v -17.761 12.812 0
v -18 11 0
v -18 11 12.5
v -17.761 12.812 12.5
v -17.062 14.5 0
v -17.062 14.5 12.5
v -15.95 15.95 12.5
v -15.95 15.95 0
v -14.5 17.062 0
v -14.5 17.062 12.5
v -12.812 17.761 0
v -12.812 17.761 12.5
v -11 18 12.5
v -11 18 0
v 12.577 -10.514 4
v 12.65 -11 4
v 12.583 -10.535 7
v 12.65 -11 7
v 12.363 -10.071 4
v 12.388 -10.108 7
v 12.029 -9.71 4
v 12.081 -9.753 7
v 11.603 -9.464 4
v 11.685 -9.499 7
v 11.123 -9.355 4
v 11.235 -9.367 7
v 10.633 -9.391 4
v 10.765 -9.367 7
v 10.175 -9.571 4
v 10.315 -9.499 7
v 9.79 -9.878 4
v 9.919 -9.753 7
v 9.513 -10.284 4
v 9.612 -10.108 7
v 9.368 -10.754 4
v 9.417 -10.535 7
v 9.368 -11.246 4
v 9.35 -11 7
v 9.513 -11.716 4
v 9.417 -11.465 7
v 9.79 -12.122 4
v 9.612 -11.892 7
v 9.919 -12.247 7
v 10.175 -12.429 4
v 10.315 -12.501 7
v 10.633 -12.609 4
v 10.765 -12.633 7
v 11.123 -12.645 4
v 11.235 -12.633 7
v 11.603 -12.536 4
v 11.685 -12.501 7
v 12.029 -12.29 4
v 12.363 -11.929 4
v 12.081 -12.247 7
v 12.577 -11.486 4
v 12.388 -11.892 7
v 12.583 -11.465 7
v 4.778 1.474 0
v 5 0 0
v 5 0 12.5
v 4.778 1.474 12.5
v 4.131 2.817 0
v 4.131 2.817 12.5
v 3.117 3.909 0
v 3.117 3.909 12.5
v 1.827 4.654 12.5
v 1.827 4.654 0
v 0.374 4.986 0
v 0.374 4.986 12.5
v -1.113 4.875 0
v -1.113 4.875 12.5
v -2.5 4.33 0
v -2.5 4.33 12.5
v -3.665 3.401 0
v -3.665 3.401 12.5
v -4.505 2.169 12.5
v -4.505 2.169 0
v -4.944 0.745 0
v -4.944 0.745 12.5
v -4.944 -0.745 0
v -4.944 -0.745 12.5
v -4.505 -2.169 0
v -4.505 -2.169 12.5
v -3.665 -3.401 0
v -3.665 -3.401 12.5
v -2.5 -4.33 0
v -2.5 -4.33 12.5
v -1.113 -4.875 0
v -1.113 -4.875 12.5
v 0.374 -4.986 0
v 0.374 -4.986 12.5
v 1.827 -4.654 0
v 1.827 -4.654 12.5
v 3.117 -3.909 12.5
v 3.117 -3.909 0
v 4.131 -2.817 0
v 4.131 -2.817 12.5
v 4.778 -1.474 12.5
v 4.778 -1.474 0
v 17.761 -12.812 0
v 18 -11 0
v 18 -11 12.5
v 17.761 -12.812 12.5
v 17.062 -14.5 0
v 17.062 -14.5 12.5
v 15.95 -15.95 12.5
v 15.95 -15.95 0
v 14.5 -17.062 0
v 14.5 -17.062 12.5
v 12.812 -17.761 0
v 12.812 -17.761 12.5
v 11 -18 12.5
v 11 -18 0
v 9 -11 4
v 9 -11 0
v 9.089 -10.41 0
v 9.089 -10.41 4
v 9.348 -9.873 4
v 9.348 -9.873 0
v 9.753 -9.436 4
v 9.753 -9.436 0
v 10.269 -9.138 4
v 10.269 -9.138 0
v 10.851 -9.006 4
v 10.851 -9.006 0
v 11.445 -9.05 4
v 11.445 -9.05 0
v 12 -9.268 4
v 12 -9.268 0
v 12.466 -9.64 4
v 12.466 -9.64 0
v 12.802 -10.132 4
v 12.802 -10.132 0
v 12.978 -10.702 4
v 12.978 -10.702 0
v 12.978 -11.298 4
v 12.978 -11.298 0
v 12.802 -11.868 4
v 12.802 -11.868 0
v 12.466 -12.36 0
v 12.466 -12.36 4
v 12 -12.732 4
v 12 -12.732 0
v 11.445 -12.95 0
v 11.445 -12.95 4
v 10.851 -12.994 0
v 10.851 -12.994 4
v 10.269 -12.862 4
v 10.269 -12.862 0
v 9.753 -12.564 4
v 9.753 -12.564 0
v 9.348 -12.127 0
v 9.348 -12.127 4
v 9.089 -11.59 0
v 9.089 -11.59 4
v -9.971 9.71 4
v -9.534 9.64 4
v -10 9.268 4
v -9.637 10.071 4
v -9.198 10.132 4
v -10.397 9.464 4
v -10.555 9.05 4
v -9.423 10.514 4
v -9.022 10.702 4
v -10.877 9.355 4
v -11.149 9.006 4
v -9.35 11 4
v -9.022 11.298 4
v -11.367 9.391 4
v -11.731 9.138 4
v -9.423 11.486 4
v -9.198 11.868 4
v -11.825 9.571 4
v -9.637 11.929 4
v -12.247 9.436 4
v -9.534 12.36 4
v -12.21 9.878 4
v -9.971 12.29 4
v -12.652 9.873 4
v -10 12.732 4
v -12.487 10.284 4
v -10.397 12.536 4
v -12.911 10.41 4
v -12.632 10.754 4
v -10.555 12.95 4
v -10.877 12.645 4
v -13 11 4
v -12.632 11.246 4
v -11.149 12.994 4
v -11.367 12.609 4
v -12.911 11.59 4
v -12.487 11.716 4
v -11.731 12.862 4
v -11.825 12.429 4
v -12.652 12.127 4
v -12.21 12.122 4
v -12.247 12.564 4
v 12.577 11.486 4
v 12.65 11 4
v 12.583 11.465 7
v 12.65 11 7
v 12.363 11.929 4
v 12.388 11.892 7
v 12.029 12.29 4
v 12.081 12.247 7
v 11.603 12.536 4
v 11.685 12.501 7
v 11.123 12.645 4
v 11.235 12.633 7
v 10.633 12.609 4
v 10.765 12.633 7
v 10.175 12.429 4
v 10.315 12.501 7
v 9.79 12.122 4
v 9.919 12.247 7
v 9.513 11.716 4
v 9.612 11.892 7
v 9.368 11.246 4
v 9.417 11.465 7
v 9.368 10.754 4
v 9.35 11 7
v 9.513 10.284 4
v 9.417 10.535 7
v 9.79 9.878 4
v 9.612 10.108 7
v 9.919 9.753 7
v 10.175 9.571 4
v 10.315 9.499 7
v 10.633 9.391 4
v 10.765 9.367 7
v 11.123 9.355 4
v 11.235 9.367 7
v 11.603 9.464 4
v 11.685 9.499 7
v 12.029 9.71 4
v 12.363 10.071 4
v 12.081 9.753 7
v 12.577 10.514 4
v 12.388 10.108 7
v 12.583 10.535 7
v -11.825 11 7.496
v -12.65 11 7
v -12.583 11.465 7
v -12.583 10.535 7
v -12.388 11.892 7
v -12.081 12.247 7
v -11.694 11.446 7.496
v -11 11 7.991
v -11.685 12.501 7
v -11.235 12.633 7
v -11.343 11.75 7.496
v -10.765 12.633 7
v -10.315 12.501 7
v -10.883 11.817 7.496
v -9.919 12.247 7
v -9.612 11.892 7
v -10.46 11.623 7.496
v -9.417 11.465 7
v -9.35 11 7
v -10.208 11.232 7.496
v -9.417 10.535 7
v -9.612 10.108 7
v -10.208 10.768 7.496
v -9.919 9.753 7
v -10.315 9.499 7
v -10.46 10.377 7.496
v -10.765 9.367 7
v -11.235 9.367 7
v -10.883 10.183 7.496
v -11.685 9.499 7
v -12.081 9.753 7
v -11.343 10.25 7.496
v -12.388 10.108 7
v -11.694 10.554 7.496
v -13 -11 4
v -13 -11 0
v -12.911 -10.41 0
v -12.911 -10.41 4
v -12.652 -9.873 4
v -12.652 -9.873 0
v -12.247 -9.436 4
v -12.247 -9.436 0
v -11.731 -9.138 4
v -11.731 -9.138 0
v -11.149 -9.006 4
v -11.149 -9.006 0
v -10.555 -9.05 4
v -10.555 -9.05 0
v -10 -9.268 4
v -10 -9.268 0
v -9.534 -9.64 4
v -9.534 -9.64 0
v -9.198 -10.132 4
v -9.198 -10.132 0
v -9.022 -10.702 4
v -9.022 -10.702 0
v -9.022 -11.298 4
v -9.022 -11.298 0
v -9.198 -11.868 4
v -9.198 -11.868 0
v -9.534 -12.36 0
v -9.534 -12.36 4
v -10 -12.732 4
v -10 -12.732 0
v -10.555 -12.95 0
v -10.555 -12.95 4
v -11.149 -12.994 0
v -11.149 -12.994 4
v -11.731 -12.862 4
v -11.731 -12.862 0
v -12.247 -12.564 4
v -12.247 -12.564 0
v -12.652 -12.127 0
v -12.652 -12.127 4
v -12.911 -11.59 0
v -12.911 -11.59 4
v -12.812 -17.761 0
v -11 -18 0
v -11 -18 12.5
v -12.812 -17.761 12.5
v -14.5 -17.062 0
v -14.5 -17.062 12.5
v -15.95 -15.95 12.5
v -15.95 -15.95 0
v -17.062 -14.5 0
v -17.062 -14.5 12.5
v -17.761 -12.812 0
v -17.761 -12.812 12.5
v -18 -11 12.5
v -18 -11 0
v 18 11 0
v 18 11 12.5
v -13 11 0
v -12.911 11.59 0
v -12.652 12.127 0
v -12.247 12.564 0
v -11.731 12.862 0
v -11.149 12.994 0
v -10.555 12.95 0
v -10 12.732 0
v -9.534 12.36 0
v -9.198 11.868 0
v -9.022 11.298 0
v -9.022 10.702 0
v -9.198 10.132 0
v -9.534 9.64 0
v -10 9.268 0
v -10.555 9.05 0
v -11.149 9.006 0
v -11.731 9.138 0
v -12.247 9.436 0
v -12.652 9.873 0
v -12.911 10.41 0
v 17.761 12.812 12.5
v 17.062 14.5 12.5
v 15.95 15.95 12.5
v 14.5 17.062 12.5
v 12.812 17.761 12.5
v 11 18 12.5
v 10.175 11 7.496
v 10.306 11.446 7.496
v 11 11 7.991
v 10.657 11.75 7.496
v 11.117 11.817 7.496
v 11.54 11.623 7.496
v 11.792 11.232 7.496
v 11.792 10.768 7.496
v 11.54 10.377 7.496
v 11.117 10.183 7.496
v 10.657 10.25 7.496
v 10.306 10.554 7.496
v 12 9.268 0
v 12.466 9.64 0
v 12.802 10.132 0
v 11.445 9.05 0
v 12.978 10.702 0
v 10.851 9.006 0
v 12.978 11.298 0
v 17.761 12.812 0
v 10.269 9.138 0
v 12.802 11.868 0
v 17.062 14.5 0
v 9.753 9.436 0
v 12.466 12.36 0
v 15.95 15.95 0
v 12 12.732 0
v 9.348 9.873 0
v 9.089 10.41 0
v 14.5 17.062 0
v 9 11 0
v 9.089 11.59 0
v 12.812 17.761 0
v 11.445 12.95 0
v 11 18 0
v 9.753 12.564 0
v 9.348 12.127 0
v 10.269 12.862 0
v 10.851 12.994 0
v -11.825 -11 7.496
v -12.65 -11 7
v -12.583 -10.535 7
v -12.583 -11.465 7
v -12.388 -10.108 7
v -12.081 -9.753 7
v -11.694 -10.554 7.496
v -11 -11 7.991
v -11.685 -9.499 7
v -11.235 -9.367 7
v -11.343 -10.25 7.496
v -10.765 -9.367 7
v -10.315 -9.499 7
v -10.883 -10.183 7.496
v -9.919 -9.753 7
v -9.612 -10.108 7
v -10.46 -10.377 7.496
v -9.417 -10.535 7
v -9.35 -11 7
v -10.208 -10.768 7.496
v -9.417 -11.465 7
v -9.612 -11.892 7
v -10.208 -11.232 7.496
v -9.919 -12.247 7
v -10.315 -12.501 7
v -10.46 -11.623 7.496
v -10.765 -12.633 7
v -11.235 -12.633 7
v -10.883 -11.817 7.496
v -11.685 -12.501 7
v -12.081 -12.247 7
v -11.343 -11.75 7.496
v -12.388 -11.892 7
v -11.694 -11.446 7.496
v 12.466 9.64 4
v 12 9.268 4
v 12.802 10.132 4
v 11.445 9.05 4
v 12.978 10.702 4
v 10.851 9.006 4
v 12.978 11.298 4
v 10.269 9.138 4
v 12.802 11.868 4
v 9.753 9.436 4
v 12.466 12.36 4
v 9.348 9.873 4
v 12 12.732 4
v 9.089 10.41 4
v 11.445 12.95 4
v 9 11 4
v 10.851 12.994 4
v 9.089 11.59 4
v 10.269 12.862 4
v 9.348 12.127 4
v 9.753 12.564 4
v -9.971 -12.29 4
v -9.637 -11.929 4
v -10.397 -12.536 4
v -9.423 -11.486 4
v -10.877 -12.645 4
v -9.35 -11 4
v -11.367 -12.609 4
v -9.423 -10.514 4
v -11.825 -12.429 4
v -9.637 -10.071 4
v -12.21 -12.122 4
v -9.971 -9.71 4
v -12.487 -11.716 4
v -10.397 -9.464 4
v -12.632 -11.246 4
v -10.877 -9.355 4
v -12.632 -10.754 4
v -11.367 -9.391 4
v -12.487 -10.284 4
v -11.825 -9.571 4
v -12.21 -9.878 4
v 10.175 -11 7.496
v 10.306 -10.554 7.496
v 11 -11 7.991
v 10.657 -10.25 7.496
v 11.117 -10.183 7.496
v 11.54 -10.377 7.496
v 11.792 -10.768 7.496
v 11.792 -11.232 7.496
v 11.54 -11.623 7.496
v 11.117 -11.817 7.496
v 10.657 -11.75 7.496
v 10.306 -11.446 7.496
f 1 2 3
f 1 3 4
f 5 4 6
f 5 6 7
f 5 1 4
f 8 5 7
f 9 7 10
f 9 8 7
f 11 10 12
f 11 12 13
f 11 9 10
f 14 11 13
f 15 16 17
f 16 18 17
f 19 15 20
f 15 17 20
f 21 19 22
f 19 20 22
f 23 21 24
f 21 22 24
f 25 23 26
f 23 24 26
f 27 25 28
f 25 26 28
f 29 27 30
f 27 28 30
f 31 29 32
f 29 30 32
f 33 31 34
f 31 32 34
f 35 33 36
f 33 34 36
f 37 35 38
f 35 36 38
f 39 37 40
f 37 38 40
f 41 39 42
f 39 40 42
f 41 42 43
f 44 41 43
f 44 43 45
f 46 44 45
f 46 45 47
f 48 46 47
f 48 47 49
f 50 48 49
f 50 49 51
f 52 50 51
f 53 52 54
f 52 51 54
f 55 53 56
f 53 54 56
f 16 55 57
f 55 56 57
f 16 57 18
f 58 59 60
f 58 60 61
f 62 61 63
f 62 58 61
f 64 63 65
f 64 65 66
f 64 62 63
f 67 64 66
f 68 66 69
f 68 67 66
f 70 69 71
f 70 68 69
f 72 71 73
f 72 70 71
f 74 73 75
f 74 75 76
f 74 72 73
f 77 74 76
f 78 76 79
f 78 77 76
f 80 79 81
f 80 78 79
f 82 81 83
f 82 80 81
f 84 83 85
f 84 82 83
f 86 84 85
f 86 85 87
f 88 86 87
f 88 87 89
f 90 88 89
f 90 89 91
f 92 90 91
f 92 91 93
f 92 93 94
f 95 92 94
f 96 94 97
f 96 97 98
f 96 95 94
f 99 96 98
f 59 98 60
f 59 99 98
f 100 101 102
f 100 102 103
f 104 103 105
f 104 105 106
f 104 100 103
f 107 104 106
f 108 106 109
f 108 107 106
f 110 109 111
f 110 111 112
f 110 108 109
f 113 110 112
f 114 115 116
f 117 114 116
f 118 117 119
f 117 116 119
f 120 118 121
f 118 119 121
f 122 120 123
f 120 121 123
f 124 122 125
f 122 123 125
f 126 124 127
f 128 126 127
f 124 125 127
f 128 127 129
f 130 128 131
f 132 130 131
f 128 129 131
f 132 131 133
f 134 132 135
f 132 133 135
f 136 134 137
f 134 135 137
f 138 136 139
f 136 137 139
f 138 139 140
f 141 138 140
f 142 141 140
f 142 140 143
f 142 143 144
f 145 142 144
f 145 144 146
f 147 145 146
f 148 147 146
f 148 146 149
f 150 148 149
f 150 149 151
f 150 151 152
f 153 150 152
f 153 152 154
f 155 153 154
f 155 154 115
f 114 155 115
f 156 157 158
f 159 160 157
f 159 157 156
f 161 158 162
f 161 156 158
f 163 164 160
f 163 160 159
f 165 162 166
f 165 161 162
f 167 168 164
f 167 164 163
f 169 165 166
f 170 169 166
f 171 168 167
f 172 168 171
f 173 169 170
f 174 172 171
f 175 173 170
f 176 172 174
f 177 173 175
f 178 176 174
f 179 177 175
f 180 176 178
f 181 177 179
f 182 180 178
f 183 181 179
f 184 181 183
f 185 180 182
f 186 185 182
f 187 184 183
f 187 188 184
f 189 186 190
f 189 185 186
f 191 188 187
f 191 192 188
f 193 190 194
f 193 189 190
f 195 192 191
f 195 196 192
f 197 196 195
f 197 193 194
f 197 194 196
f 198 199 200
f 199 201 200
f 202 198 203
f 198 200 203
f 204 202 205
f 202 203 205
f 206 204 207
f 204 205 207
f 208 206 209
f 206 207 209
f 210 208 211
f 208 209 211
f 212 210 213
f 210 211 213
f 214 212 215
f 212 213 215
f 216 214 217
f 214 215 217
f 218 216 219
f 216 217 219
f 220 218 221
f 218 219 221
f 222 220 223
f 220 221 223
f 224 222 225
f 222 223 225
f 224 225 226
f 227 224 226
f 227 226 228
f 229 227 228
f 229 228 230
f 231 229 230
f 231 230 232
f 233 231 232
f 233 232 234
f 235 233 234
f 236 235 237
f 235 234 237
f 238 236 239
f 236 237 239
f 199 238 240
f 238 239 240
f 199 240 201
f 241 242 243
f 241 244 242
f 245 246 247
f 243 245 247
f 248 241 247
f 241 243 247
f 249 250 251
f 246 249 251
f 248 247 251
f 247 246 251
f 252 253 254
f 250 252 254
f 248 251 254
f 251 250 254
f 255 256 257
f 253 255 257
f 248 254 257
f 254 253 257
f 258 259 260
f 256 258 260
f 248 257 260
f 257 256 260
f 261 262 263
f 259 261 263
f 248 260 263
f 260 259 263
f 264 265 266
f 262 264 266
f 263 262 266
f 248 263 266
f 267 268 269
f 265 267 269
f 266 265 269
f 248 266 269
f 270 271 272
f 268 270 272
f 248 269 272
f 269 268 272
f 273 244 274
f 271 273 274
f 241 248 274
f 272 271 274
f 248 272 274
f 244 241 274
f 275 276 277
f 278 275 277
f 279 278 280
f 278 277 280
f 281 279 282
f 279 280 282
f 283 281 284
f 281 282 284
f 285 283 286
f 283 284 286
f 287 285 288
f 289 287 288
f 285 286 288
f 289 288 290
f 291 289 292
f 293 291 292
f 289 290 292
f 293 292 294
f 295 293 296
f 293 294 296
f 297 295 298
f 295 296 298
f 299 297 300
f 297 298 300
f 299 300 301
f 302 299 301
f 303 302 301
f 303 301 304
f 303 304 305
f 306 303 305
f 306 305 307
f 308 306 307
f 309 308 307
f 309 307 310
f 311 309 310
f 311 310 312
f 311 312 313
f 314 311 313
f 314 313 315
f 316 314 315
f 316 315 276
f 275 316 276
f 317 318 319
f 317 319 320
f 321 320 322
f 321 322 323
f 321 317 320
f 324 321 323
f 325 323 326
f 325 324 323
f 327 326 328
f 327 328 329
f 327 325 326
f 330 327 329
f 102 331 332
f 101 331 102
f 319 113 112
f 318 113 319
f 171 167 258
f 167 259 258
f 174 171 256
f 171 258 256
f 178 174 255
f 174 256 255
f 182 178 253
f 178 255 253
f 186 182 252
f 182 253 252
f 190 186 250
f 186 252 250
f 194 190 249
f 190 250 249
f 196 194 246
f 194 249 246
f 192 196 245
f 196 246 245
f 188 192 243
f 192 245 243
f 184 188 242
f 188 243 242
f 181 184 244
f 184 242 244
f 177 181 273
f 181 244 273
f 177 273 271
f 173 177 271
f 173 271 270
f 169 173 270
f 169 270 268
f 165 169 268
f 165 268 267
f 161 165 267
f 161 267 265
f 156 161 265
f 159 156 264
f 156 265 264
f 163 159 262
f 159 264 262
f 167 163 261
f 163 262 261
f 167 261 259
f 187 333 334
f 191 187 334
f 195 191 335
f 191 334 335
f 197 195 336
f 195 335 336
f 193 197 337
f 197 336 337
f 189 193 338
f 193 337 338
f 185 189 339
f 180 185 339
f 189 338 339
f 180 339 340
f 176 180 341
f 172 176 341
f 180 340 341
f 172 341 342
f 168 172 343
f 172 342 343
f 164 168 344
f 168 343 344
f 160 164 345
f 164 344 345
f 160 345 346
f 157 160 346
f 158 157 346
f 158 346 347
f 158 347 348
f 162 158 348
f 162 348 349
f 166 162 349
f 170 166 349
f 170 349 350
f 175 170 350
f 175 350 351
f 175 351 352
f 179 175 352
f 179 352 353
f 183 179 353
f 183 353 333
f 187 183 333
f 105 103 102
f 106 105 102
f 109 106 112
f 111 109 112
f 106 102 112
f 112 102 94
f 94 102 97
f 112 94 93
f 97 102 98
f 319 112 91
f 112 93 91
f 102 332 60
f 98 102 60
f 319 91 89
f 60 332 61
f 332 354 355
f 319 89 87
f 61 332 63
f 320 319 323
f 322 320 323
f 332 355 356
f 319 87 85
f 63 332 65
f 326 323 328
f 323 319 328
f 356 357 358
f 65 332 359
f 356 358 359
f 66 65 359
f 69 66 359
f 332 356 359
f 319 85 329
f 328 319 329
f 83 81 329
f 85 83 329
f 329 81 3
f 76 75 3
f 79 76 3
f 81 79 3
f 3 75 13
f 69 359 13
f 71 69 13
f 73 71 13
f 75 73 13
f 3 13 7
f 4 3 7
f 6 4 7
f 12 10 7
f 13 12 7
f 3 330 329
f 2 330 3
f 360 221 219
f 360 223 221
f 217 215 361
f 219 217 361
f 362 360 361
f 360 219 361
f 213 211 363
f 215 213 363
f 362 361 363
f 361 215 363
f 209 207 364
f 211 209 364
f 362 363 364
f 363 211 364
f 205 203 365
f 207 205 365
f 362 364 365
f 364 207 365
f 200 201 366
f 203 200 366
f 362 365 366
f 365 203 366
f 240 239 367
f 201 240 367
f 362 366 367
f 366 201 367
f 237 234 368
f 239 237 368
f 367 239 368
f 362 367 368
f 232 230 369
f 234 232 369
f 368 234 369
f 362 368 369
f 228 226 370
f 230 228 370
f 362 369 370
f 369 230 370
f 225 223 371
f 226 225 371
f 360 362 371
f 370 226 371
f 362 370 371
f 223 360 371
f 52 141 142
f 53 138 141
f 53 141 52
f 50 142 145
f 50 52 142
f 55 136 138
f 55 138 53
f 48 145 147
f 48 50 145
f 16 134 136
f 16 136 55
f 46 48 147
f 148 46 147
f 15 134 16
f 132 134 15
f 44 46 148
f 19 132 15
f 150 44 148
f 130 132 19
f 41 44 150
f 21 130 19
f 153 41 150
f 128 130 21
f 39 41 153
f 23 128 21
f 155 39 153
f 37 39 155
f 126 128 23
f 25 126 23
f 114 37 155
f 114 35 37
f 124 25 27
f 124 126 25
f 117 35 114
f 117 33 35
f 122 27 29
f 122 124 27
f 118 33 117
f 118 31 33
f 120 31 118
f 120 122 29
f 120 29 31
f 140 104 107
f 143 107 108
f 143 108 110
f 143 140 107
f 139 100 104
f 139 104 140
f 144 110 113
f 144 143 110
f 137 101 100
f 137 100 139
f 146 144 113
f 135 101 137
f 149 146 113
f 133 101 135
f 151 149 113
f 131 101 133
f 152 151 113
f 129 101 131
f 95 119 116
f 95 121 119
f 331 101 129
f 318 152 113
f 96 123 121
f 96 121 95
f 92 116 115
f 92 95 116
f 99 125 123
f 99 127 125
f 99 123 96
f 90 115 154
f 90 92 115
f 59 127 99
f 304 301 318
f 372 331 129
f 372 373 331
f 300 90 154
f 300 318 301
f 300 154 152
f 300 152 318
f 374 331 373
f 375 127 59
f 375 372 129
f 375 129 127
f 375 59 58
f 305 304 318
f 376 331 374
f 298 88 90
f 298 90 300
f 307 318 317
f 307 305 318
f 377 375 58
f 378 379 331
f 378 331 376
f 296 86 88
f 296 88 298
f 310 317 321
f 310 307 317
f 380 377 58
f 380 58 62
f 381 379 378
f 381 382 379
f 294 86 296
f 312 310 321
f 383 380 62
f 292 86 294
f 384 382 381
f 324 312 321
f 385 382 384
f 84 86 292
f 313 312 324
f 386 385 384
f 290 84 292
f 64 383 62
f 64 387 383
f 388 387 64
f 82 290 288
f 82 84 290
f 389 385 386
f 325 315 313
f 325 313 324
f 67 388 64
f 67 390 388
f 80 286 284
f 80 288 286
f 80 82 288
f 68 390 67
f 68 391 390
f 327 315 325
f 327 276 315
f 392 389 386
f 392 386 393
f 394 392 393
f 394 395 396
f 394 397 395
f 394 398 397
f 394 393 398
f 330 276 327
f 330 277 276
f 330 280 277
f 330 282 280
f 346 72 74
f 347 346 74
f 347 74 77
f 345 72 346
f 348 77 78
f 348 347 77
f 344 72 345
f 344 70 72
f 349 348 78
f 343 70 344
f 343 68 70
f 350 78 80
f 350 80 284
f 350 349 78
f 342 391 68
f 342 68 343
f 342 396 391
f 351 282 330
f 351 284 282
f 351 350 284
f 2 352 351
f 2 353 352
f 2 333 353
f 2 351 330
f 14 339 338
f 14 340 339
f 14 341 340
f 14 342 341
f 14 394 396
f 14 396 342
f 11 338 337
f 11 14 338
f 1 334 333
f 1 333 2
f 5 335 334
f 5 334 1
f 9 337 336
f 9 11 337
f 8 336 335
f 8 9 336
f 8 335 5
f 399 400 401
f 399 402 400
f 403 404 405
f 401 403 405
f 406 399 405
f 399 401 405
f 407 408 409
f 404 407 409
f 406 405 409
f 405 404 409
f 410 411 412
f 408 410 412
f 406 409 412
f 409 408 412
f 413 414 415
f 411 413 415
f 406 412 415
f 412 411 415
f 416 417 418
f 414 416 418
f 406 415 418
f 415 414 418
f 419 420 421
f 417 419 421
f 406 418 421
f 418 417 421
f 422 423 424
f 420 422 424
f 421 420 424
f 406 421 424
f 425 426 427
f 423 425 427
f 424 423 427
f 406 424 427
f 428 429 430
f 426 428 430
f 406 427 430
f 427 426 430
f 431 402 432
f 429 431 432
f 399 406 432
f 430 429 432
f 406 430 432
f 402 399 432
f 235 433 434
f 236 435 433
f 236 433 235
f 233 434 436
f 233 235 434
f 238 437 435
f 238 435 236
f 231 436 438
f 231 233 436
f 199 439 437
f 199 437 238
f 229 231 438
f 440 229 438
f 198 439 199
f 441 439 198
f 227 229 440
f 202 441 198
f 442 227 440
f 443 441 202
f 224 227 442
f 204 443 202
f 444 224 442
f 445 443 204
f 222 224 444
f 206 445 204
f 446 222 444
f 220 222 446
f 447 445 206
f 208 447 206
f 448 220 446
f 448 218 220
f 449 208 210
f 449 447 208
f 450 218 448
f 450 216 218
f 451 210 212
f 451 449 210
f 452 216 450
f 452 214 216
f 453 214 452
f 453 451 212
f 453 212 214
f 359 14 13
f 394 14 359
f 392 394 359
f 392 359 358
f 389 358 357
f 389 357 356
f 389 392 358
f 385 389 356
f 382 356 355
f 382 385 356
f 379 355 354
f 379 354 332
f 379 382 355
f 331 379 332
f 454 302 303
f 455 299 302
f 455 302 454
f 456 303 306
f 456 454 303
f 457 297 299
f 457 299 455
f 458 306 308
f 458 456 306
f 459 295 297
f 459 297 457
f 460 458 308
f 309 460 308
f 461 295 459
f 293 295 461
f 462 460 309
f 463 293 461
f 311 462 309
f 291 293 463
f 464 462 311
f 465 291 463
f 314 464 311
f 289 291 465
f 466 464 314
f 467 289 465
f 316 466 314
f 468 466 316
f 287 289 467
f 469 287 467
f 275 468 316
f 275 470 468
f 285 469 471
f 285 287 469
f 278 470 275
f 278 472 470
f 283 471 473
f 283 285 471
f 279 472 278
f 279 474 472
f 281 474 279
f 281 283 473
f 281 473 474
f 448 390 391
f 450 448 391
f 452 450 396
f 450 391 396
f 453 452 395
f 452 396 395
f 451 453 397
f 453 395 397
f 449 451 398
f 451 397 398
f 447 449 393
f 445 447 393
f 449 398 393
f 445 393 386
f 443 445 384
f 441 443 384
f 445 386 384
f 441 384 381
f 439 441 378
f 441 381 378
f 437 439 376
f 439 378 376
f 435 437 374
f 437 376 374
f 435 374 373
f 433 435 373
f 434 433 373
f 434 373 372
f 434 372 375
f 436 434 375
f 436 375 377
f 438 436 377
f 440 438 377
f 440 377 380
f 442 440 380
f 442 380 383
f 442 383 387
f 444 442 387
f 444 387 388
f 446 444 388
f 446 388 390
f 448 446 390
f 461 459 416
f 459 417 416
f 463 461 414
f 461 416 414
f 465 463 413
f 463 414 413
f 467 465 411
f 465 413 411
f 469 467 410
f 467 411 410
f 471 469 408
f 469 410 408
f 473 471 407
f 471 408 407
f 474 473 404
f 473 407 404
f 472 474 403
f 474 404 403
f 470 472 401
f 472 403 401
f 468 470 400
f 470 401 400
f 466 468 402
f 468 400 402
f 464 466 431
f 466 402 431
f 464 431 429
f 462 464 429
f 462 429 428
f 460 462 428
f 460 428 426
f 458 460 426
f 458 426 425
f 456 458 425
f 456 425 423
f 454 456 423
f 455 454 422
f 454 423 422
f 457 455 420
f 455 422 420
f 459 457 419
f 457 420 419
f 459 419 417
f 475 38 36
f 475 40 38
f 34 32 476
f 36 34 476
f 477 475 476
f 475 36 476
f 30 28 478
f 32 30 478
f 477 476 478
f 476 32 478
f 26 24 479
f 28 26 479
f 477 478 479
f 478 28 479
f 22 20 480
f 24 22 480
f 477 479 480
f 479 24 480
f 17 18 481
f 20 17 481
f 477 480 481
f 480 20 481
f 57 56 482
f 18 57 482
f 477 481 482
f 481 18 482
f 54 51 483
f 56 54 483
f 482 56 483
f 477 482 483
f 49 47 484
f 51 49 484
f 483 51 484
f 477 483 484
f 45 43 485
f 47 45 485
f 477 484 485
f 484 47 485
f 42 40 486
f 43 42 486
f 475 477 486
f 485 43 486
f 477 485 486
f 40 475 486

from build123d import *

# Parameters (mm, degrees)
ESBO_O1_R                       = 5
RESSALTO_EXTRUS_O1_DEPTH        = 12.5
FURO_ROSCADO_DE_M41_D           = 3.3
FURO_ROSCADO_DE_M41_DEPTH       = 7
FURO_ROSCADO_DE_M41_CBORE_D     = 4
FURO_ROSCADO_DE_M41_CBORE_DEPTH = 4
FURO_ROSCADO_DE_M41_TIP         = 0.991420021


with BuildPart() as part:
    # Esboço1 → Ressalto-extrusão1 (new body)
    with BuildSketch(Plane.XY):
        with BuildLine():
            Line((-11, 18), (11, 18))
            ThreePointArc((11, 18), (15.949747468, 15.949747468), (18, 11))
            Line((18, 11), (18, -11))
            ThreePointArc((18, -11), (15.949747468, -15.949747468), (11, -18))
            Line((11, -18), (-11, -18))
            ThreePointArc((-11, -18), (-15.949747468, -15.949747468), (-18, -11))
            Line((-18, -11), (-18, 11))
            ThreePointArc((-18, 11), (-15.949747468, 15.949747468), (-11, 18))
        make_face()
        Circle(ESBO_O1_R, mode=Mode.SUBTRACT)
    extrude(amount=RESSALTO_EXTRUS_O1_DEPTH)

    # Furo roscado de M41
    with Locations(Plane(origin=(0, 0, 0), x_dir=(-1, 0, 0), z_dir=(0, 0, -1))):
        with Locations((11, -11), (0, 0), (11, 11), (-11, -11), (-11, 11)):
            CounterBoreHole(FURO_ROSCADO_DE_M41_D / 2, FURO_ROSCADO_DE_M41_CBORE_D / 2, FURO_ROSCADO_DE_M41_CBORE_DEPTH, depth=FURO_ROSCADO_DE_M41_DEPTH)
            with Locations((0, 0, -(FURO_ROSCADO_DE_M41_DEPTH + FURO_ROSCADO_DE_M41_TIP / 2))):  # 118° drill point
                Cone(0, FURO_ROSCADO_DE_M41_D / 2, FURO_ROSCADO_DE_M41_TIP, mode=Mode.SUBTRACT)


solid = part.part
